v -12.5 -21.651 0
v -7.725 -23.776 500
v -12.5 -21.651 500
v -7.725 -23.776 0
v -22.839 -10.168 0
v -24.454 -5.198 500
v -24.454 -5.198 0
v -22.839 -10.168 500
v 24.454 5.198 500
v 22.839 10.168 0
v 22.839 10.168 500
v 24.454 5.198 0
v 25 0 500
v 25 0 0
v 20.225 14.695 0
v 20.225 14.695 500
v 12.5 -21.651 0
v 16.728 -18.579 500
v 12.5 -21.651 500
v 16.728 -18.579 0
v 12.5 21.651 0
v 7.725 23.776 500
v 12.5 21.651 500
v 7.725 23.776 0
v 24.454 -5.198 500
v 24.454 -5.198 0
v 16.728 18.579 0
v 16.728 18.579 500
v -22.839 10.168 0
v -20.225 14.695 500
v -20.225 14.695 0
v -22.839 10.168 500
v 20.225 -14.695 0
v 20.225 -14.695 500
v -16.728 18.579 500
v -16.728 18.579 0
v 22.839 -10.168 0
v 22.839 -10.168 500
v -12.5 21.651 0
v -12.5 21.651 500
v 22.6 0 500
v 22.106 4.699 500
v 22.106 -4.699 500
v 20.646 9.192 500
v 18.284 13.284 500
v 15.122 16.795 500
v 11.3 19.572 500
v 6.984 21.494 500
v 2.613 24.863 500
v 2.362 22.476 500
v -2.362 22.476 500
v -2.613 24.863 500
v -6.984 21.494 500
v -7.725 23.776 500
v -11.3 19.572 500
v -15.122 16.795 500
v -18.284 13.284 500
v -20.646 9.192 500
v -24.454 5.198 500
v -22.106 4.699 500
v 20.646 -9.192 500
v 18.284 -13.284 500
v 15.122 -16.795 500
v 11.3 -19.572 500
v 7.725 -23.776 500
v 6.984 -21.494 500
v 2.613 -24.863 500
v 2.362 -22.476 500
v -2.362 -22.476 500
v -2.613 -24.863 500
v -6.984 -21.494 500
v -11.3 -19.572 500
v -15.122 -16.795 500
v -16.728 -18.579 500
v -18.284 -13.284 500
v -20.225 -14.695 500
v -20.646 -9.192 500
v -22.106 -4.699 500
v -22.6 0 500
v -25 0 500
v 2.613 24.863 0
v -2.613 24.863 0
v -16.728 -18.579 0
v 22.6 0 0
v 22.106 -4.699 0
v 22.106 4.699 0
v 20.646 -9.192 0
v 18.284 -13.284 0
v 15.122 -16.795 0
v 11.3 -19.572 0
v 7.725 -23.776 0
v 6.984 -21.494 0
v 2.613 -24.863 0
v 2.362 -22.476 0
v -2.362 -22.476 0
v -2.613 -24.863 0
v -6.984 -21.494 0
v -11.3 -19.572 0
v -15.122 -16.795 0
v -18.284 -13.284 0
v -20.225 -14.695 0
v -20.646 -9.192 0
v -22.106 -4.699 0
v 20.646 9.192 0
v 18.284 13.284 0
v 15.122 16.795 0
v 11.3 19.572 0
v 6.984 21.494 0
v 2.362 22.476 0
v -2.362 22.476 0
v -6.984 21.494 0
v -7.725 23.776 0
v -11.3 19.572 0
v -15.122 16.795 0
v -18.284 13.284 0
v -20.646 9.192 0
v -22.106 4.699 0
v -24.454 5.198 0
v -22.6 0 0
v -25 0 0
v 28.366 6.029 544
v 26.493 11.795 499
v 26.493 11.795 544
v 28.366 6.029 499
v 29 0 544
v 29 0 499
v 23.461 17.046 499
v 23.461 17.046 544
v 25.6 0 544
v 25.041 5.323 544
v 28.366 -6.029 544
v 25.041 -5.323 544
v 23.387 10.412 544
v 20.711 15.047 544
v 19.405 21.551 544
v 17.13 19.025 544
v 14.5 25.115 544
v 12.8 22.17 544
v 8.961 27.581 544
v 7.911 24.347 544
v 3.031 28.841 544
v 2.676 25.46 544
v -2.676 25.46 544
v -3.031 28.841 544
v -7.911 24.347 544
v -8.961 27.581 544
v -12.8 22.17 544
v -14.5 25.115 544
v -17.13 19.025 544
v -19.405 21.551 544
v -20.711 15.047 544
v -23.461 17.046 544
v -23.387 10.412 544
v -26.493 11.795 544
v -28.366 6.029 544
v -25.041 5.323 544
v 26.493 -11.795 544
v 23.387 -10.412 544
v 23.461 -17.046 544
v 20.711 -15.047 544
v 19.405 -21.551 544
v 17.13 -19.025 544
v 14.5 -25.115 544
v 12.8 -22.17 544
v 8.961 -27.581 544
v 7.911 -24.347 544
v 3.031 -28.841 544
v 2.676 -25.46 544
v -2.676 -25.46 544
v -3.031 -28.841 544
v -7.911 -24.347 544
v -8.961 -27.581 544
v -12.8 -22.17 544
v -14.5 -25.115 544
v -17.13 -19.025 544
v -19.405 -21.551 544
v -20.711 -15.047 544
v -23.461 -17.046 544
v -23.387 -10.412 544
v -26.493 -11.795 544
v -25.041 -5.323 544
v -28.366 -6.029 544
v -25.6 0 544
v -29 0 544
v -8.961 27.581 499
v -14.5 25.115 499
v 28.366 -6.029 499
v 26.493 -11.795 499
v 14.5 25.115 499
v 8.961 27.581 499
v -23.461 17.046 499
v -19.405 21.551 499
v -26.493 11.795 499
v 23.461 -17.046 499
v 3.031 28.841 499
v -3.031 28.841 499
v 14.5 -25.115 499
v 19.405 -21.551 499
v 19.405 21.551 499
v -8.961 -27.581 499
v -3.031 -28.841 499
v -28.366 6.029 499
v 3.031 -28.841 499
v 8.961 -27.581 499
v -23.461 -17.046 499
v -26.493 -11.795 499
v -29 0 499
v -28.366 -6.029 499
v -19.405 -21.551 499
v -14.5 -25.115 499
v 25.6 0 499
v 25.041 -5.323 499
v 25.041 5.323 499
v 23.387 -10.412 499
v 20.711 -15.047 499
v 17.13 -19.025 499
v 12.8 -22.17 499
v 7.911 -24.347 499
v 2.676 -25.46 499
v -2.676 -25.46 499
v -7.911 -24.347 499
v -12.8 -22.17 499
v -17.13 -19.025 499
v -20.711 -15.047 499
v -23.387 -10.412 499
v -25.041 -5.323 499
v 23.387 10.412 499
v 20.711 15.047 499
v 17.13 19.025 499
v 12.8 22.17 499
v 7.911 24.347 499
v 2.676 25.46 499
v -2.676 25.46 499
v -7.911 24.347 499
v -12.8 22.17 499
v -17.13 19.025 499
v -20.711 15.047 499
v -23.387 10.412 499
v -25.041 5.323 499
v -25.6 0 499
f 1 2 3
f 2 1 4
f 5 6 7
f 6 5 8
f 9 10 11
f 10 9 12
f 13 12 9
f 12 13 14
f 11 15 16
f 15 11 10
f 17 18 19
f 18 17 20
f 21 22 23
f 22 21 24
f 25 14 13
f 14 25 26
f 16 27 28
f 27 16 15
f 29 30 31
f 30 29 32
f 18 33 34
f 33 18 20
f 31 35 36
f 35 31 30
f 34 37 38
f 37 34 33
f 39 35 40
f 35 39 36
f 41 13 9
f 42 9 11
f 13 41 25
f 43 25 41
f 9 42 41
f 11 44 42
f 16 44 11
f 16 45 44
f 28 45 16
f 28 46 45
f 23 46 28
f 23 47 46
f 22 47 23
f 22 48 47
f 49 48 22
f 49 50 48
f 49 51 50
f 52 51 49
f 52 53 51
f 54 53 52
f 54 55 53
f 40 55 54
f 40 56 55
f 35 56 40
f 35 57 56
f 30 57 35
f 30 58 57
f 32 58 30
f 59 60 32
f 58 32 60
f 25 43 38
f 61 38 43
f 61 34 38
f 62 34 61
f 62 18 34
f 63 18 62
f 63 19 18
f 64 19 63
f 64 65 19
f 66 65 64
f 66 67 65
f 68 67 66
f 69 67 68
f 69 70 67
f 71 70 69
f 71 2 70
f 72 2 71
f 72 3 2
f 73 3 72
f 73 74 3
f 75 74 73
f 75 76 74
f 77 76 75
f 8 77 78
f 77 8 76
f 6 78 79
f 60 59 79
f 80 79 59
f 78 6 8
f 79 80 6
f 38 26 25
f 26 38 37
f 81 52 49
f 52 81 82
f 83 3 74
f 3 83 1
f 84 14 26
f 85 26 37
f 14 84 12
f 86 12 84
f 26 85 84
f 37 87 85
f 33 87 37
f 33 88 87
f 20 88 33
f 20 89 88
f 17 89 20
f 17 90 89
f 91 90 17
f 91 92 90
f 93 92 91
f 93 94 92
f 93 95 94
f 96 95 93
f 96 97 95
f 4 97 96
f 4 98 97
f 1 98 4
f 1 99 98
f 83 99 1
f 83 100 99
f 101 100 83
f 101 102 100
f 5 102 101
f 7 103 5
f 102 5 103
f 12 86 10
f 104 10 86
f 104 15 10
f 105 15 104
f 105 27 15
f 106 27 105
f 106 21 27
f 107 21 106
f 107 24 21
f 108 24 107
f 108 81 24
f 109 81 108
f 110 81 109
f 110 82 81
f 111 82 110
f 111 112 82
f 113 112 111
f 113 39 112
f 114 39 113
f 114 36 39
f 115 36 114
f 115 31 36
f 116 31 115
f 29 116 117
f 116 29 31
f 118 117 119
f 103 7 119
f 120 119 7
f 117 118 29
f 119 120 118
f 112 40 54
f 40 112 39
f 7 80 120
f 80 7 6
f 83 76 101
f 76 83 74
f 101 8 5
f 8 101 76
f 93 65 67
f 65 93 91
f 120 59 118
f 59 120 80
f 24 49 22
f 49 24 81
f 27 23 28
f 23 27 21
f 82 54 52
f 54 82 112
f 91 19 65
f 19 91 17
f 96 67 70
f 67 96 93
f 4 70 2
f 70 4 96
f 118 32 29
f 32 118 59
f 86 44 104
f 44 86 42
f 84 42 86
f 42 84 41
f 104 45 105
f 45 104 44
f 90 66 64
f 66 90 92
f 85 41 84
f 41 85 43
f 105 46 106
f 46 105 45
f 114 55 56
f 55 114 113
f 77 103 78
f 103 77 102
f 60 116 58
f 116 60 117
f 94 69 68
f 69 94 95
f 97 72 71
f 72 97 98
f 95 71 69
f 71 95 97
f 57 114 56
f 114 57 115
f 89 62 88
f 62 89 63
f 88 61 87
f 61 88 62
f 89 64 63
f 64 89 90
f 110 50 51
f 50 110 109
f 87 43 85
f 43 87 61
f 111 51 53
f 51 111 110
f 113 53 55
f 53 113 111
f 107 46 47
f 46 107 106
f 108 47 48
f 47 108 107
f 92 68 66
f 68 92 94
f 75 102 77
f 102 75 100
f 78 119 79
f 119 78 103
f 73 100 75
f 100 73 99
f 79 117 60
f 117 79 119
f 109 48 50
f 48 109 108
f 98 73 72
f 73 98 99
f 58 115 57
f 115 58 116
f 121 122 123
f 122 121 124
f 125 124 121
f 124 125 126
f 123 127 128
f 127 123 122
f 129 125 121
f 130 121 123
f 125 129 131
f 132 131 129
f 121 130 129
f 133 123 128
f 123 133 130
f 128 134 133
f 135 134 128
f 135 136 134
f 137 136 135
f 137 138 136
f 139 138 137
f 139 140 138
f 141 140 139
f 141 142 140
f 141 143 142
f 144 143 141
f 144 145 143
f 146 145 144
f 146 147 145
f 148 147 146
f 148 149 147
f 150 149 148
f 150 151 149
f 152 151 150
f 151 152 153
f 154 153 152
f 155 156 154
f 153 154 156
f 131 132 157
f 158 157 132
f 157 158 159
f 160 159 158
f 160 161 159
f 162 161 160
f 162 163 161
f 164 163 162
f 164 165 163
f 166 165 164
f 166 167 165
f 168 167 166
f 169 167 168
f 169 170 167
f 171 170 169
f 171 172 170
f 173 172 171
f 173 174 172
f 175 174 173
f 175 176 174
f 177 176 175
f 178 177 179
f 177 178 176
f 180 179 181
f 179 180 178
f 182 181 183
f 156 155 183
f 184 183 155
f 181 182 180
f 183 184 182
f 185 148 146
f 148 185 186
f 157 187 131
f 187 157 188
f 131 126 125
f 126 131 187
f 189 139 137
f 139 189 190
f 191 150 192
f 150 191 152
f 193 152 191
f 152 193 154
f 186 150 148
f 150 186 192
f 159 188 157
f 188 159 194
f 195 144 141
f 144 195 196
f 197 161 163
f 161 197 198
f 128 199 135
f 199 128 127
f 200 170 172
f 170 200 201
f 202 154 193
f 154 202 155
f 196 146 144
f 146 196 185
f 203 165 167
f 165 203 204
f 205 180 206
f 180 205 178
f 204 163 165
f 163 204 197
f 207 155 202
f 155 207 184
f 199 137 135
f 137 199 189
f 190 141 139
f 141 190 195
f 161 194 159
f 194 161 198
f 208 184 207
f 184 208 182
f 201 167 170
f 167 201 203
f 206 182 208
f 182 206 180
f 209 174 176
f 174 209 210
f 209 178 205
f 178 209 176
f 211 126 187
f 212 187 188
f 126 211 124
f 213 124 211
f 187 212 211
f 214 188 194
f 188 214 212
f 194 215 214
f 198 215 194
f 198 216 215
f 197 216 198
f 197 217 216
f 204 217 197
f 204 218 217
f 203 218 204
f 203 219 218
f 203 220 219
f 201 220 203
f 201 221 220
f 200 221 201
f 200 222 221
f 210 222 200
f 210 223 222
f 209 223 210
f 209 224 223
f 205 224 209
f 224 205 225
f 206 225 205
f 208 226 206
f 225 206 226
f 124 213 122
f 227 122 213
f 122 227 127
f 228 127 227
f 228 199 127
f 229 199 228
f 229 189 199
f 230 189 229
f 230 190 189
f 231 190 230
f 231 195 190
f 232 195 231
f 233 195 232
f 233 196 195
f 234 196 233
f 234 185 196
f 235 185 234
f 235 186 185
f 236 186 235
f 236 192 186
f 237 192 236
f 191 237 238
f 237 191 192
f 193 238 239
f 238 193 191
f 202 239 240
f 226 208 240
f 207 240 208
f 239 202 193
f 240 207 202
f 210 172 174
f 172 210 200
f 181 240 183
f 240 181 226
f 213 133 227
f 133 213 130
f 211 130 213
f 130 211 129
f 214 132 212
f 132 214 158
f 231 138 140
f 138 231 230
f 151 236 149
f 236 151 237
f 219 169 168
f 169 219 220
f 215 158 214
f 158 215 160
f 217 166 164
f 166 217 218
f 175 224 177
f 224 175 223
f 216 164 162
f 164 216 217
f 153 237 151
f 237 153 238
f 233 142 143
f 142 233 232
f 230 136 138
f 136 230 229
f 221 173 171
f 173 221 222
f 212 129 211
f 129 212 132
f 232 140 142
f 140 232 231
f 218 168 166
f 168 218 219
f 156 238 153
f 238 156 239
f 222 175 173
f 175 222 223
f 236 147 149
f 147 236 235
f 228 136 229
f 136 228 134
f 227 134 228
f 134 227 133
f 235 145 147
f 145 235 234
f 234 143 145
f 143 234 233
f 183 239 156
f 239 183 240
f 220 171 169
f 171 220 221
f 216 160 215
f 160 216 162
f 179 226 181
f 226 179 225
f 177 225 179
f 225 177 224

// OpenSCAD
// Parameters
pipe_standard = 0; //[0:0:1]
nominal_diameter_mm = 50; //[25:100:1]
length_mm = 500; //[250:1000:1]
include_end_fitting = 1; //[0:1:1]
pipe_od = 50; //[25:100:1]
pipe_wall = 2.4; //[1.2:4.8:0.1]
socket_length = 45; //[20:90:1]
socket_wall = 3.0; //[1.5:6.0:0.1]
socket_od_extra = 8; //[2:20:1]
socket_clearance = 0.6; //[0.2:1.5:0.1]
overlap = 1.0; //[0.5:2.0:0.1]

// Ht Pipe - complete geometry
module ht_pipe() {
  color([0.85, 0.85, 0.8]) { // Off-white for PVC
    // Pipe body
    difference() {
      cylinder(h=length_mm, r=pipe_od/2, center=false);
      translate([0, 0, 0])
        cylinder(h=length_mm, r=pipe_od/2 - pipe_wall, center=false);
    }
    
    // Integrated end fitting socket
    translate([0, 0, length_mm - overlap]) {
      difference() {
        cylinder(h=socket_length, r=(pipe_od + socket_od_extra)/2, center=false);
        translate([0, 0, 0])
          cylinder(h=socket_length, r=pipe_od/2 + socket_clearance, center=false);
      }
    }
  }
}

// Assembly
module assembly() {
  ht_pipe();
}

assembly();
